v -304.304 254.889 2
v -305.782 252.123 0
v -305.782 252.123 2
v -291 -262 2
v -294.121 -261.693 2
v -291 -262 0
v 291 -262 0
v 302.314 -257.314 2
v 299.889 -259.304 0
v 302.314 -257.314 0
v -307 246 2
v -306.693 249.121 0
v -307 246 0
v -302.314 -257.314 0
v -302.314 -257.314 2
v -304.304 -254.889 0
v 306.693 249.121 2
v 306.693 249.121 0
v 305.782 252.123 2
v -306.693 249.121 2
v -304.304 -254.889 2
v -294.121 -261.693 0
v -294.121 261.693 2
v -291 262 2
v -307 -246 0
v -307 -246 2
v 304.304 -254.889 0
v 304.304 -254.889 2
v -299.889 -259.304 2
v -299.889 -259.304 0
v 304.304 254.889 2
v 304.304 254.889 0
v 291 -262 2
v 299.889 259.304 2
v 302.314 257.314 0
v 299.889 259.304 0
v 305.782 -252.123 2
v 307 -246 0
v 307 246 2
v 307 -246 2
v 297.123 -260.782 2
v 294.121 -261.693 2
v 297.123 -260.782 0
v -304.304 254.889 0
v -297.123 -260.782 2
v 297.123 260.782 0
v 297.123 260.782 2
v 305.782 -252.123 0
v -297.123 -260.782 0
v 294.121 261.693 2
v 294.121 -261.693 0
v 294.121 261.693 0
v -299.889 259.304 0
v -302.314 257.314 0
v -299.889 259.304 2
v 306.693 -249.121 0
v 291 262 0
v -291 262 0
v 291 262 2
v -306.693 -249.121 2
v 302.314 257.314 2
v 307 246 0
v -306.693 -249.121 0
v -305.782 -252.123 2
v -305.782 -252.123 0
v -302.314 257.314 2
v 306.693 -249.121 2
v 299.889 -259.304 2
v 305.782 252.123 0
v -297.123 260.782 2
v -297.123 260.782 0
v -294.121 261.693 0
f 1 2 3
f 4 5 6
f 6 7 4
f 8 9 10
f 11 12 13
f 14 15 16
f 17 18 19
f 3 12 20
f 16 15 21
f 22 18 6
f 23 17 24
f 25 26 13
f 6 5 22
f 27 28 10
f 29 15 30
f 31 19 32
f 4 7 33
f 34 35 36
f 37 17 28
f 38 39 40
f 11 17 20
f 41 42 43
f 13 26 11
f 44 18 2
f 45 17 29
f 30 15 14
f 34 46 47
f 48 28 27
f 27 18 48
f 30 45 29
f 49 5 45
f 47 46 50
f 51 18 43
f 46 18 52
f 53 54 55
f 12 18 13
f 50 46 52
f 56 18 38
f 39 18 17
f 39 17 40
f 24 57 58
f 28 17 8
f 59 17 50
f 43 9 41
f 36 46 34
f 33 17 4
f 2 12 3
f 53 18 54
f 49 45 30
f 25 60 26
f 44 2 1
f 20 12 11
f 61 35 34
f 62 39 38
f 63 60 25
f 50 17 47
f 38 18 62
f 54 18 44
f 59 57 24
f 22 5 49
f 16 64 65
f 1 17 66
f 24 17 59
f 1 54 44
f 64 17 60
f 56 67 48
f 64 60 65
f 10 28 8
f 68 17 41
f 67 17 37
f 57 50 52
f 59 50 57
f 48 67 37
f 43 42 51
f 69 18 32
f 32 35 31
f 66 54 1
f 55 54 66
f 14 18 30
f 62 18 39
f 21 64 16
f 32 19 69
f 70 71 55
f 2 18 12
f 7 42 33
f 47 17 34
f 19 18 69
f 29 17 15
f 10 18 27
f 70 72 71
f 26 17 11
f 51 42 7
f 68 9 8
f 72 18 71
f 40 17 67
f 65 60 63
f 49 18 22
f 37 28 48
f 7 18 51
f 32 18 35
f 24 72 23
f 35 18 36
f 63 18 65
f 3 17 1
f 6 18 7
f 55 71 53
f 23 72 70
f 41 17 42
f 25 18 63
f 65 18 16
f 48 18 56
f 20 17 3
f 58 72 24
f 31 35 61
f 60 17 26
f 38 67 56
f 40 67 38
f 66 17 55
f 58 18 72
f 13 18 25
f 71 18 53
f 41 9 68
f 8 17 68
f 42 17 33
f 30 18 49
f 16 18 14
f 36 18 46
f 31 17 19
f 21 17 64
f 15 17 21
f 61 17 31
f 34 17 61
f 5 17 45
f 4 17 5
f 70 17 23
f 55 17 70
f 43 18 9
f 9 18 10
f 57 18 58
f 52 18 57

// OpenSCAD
use <main.scad>
lift_center_x        = -15;
lift_lowered_deck_z  = 330;
lift_deck_thickness  = 12;
payload_deck_length  = 650;
payload_deck_width   = 560;
show_component_labels = false;
translate([-lift_center_x, 0, -lift_lowered_deck_z])
    lift_deck_pad(0);
